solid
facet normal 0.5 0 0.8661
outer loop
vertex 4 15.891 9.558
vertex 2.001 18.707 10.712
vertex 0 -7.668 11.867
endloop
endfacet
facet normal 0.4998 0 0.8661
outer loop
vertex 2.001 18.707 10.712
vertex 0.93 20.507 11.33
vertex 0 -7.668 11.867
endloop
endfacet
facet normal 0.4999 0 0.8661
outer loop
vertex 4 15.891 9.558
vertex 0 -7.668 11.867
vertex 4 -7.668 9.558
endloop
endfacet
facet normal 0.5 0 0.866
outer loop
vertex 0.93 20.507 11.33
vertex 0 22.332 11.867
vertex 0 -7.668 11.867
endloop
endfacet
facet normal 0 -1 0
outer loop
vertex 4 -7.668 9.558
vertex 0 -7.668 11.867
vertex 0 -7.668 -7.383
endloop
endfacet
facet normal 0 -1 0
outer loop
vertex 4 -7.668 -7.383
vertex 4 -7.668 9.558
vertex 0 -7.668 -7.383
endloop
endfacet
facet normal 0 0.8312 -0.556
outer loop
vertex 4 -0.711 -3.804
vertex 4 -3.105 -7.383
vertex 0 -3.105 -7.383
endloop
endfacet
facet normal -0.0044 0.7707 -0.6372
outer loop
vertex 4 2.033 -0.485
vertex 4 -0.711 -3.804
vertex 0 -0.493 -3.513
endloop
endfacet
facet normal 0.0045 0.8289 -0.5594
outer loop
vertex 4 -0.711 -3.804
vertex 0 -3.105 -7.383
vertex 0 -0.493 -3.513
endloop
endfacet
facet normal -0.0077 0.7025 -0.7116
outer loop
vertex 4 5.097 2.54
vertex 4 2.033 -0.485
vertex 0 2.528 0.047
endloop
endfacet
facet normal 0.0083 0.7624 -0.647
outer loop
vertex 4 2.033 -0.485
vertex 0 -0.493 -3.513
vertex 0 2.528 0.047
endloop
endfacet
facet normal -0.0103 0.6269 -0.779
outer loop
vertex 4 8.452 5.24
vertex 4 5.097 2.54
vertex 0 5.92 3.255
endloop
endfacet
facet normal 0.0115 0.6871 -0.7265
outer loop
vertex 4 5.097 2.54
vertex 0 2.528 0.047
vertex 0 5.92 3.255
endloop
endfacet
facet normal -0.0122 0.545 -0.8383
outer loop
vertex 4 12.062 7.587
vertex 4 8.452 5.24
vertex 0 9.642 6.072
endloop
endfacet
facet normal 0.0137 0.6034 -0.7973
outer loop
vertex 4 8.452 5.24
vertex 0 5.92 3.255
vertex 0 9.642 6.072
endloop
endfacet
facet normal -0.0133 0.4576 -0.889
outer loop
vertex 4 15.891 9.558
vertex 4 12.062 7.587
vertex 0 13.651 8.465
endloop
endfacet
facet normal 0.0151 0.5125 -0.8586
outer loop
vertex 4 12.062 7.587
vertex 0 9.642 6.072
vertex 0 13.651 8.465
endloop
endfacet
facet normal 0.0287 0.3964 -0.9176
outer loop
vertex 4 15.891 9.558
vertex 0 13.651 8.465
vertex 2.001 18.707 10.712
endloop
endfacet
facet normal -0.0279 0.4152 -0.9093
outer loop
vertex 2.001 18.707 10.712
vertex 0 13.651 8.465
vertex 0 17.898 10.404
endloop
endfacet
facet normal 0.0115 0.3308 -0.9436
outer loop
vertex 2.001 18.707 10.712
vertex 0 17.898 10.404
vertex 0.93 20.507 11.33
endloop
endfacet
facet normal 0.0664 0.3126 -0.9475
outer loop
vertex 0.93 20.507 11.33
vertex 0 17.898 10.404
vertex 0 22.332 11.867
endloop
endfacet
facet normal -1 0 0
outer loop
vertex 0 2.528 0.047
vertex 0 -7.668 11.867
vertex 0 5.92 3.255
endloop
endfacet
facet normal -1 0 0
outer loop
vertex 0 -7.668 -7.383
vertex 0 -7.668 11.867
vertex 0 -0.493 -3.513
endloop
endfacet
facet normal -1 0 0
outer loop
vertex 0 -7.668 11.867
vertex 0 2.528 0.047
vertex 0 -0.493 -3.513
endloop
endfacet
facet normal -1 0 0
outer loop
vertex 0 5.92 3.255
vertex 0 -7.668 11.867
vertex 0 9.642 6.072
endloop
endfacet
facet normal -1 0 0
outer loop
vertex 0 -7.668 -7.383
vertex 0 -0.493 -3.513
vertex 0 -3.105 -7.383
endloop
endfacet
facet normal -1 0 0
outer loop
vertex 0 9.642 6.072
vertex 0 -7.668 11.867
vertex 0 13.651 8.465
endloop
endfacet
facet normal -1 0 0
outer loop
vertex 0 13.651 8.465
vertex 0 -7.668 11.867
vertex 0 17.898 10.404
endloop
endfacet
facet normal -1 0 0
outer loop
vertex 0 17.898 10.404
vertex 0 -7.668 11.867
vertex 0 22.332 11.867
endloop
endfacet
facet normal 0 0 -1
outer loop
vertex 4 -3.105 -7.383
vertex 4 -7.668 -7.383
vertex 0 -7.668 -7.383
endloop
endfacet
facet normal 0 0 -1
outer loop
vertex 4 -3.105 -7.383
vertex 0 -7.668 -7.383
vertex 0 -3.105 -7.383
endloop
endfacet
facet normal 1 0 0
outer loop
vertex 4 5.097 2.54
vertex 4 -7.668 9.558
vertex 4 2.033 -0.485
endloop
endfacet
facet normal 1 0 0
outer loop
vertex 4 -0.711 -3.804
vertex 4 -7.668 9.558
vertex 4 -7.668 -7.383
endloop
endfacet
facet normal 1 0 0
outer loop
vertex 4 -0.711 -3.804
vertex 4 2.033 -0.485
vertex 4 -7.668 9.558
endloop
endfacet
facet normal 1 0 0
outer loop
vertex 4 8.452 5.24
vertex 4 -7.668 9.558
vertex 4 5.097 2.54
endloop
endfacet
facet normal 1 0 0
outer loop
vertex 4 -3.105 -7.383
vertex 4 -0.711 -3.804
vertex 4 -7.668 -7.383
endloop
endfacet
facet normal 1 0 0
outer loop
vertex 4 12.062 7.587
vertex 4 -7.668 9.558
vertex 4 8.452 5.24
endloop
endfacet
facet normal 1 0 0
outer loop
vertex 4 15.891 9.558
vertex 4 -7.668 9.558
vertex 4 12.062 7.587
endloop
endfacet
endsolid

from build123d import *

# Parameters (mm, degrees)
BOSS_EXTRUDE1_DEPTH = 4
SKETCH2_W           = 10.75
SKETCH2_H           = 20.327264221
CUT_EXTRUDE1_DEPTH  = 4
CUT_EXTRUDE2_DEPTH  = 50.8


with BuildPart() as part:
    # Sketch1 → Boss-Extrude1 (new body)
    with BuildSketch(Plane(origin=(0, 0, 0), x_dir=(0, 0, -1), z_dir=(1, 0, 0))):
        with BuildLine():
            Line((-11.867139326, 22.331980986), (-11.867139326, -7.668019014))
            Line((-11.867139326, -7.668019014), (18.132860674, -7.668019014))
            ThreePointArc((18.132860674, -7.668019014), (-0.870157122, 3.328963189), (-11.867139326, 22.331980986))
        make_face()
    extrude(amount=BOSS_EXTRUDE1_DEPTH)

    # Sketch2 → Cut-Extrude1 (cut)
    with BuildSketch(Plane(origin=(4, 0, 0), x_dir=(0, 0, -1), z_dir=(1, 0, 0))):
        with Locations((12.757860674, 2.495613097)):
            Rectangle(SKETCH2_W, SKETCH2_H)
    extrude(amount=-CUT_EXTRUDE1_DEPTH, mode=Mode.SUBTRACT)

    # Sketch3 → Cut-Extrude2 (cut)
    with BuildSketch(Plane.XZ.offset(7.668019014)):
        Polygon((0, 11.867139326), (4, 9.557738249), (4, 11.867139326), align=None)
    extrude(amount=-CUT_EXTRUDE2_DEPTH, mode=Mode.SUBTRACT)


solid = part.part
